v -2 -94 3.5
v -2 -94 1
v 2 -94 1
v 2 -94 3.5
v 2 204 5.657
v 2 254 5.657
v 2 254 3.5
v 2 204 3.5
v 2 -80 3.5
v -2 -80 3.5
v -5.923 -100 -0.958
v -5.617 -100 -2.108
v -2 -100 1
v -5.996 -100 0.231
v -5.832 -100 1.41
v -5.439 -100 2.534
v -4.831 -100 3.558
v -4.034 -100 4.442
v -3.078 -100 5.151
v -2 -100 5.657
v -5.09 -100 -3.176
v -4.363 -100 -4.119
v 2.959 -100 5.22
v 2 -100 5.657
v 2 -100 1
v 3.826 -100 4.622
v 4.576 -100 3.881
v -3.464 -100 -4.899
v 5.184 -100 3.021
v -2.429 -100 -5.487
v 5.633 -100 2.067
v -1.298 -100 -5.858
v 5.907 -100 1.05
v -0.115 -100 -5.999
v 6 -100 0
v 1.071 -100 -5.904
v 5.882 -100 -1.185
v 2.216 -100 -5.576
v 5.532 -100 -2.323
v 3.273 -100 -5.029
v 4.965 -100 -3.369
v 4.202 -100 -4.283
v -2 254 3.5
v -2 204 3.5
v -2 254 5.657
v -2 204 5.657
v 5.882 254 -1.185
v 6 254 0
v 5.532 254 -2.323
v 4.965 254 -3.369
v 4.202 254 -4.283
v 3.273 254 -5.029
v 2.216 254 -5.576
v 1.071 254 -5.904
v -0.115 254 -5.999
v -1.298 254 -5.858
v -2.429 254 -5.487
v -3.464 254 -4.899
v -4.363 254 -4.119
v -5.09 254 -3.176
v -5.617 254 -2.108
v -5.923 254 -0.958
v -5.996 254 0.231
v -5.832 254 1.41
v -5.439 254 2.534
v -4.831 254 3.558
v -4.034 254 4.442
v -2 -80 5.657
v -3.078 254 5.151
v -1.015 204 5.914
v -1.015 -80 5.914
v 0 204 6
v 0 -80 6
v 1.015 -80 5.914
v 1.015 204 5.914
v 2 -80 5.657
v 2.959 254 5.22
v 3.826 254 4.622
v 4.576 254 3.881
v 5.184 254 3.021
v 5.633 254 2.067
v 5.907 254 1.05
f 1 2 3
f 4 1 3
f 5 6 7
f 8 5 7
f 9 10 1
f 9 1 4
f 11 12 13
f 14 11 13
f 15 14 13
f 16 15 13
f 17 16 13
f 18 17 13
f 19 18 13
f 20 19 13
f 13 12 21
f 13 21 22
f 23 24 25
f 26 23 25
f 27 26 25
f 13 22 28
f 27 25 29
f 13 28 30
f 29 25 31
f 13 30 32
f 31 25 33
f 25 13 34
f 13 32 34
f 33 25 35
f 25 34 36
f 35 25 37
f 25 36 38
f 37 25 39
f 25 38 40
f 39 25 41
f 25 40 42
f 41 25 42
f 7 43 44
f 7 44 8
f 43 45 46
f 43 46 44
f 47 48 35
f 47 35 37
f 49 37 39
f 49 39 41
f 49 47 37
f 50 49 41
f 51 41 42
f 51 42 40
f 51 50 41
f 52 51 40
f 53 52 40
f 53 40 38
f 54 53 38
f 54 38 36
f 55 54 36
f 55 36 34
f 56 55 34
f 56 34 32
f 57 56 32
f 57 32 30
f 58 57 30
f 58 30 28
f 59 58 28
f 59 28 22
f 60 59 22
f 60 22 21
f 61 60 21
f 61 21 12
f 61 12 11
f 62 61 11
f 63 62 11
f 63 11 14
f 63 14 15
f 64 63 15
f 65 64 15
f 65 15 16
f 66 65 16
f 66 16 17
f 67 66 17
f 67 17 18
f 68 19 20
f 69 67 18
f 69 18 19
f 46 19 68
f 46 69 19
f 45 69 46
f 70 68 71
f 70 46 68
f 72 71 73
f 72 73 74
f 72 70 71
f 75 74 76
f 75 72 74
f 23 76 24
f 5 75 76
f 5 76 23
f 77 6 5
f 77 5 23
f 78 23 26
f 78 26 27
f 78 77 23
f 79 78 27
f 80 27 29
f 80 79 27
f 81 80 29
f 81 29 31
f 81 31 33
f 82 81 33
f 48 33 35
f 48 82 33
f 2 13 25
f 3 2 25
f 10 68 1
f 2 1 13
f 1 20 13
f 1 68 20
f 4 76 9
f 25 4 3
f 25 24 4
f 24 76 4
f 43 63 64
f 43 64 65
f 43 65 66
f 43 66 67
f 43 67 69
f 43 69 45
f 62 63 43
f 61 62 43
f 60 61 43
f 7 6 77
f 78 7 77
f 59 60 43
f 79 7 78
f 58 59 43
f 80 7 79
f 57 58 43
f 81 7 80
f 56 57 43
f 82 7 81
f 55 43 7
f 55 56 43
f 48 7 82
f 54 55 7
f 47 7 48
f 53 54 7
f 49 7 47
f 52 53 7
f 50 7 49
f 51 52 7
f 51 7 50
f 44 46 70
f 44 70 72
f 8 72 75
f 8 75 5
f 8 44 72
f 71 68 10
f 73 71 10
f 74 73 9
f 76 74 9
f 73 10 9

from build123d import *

# Parameters (mm, degrees)
SKETCH1_R                = 6
BOSS_EXTRUDE1_DEPTH      = 254
BOSS_EXTRUDE1_DEPTH_BACK = 100
CUT_EXTRUDE3_START       = -100
SKETCH2_W                = 4
SKETCH2_H                = 5
CUT_EXTRUDE3_DEPTH       = 20
CUT_EXTRUDE3_DEPTH_BACK  = 0.0001
CUT_EXTRUDE4_START       = 254
SKETCH2_2_W              = 4
SKETCH2_2_H              = 5
CUT_EXTRUDE4_DEPTH       = 50
CUT_EXTRUDE6_START       = -100
SKETCH3_W                = 4
SKETCH3_H                = 10
CUT_EXTRUDE6_DEPTH       = 6


with BuildPart() as part:
    # Sketch1 → Boss-Extrude1 (new body, two sides)
    with BuildSketch(Plane(origin=(0, 0, 0), x_dir=(1, 0, 0), z_dir=(0, 1, 0))) as boss_extrude1_sk:
        Circle(SKETCH1_R)
    extrude(amount=BOSS_EXTRUDE1_DEPTH)
    extrude(boss_extrude1_sk.sketch, amount=-BOSS_EXTRUDE1_DEPTH_BACK)

    # Sketch2 → Cut-Extrude3 (cut, two sides)
    with BuildSketch(Plane(origin=(0, 0, 0), x_dir=(1, 0, 0), z_dir=(0, 1, 0)).offset(CUT_EXTRUDE3_START)) as cut_extrude3_sk:
        with Locations((0, -6)):
            Rectangle(SKETCH2_W, SKETCH2_H)
    extrude(amount=CUT_EXTRUDE3_DEPTH, mode=Mode.SUBTRACT)
    extrude(cut_extrude3_sk.sketch, amount=-CUT_EXTRUDE3_DEPTH_BACK, mode=Mode.SUBTRACT)

    # Sketch2<2> → Cut-Extrude4 (cut)
    with BuildSketch(Plane(origin=(0, 0, 0), x_dir=(1, 0, 0), z_dir=(0, 1, 0)).offset(CUT_EXTRUDE4_START)):
        with Locations((0, -6)):
            Rectangle(SKETCH2_2_W, SKETCH2_2_H)
    extrude(amount=-CUT_EXTRUDE4_DEPTH, mode=Mode.SUBTRACT)

    # Sketch3 → Cut-Extrude6 (cut)
    with BuildSketch(Plane(origin=(0, 0, 0), x_dir=(1, 0, 0), z_dir=(0, 1, 0)).offset(CUT_EXTRUDE6_START)):
        with Locations((0, -6)):
            Rectangle(SKETCH3_W, SKETCH3_H)
    extrude(amount=CUT_EXTRUDE6_DEPTH, mode=Mode.SUBTRACT)


solid = part.part
